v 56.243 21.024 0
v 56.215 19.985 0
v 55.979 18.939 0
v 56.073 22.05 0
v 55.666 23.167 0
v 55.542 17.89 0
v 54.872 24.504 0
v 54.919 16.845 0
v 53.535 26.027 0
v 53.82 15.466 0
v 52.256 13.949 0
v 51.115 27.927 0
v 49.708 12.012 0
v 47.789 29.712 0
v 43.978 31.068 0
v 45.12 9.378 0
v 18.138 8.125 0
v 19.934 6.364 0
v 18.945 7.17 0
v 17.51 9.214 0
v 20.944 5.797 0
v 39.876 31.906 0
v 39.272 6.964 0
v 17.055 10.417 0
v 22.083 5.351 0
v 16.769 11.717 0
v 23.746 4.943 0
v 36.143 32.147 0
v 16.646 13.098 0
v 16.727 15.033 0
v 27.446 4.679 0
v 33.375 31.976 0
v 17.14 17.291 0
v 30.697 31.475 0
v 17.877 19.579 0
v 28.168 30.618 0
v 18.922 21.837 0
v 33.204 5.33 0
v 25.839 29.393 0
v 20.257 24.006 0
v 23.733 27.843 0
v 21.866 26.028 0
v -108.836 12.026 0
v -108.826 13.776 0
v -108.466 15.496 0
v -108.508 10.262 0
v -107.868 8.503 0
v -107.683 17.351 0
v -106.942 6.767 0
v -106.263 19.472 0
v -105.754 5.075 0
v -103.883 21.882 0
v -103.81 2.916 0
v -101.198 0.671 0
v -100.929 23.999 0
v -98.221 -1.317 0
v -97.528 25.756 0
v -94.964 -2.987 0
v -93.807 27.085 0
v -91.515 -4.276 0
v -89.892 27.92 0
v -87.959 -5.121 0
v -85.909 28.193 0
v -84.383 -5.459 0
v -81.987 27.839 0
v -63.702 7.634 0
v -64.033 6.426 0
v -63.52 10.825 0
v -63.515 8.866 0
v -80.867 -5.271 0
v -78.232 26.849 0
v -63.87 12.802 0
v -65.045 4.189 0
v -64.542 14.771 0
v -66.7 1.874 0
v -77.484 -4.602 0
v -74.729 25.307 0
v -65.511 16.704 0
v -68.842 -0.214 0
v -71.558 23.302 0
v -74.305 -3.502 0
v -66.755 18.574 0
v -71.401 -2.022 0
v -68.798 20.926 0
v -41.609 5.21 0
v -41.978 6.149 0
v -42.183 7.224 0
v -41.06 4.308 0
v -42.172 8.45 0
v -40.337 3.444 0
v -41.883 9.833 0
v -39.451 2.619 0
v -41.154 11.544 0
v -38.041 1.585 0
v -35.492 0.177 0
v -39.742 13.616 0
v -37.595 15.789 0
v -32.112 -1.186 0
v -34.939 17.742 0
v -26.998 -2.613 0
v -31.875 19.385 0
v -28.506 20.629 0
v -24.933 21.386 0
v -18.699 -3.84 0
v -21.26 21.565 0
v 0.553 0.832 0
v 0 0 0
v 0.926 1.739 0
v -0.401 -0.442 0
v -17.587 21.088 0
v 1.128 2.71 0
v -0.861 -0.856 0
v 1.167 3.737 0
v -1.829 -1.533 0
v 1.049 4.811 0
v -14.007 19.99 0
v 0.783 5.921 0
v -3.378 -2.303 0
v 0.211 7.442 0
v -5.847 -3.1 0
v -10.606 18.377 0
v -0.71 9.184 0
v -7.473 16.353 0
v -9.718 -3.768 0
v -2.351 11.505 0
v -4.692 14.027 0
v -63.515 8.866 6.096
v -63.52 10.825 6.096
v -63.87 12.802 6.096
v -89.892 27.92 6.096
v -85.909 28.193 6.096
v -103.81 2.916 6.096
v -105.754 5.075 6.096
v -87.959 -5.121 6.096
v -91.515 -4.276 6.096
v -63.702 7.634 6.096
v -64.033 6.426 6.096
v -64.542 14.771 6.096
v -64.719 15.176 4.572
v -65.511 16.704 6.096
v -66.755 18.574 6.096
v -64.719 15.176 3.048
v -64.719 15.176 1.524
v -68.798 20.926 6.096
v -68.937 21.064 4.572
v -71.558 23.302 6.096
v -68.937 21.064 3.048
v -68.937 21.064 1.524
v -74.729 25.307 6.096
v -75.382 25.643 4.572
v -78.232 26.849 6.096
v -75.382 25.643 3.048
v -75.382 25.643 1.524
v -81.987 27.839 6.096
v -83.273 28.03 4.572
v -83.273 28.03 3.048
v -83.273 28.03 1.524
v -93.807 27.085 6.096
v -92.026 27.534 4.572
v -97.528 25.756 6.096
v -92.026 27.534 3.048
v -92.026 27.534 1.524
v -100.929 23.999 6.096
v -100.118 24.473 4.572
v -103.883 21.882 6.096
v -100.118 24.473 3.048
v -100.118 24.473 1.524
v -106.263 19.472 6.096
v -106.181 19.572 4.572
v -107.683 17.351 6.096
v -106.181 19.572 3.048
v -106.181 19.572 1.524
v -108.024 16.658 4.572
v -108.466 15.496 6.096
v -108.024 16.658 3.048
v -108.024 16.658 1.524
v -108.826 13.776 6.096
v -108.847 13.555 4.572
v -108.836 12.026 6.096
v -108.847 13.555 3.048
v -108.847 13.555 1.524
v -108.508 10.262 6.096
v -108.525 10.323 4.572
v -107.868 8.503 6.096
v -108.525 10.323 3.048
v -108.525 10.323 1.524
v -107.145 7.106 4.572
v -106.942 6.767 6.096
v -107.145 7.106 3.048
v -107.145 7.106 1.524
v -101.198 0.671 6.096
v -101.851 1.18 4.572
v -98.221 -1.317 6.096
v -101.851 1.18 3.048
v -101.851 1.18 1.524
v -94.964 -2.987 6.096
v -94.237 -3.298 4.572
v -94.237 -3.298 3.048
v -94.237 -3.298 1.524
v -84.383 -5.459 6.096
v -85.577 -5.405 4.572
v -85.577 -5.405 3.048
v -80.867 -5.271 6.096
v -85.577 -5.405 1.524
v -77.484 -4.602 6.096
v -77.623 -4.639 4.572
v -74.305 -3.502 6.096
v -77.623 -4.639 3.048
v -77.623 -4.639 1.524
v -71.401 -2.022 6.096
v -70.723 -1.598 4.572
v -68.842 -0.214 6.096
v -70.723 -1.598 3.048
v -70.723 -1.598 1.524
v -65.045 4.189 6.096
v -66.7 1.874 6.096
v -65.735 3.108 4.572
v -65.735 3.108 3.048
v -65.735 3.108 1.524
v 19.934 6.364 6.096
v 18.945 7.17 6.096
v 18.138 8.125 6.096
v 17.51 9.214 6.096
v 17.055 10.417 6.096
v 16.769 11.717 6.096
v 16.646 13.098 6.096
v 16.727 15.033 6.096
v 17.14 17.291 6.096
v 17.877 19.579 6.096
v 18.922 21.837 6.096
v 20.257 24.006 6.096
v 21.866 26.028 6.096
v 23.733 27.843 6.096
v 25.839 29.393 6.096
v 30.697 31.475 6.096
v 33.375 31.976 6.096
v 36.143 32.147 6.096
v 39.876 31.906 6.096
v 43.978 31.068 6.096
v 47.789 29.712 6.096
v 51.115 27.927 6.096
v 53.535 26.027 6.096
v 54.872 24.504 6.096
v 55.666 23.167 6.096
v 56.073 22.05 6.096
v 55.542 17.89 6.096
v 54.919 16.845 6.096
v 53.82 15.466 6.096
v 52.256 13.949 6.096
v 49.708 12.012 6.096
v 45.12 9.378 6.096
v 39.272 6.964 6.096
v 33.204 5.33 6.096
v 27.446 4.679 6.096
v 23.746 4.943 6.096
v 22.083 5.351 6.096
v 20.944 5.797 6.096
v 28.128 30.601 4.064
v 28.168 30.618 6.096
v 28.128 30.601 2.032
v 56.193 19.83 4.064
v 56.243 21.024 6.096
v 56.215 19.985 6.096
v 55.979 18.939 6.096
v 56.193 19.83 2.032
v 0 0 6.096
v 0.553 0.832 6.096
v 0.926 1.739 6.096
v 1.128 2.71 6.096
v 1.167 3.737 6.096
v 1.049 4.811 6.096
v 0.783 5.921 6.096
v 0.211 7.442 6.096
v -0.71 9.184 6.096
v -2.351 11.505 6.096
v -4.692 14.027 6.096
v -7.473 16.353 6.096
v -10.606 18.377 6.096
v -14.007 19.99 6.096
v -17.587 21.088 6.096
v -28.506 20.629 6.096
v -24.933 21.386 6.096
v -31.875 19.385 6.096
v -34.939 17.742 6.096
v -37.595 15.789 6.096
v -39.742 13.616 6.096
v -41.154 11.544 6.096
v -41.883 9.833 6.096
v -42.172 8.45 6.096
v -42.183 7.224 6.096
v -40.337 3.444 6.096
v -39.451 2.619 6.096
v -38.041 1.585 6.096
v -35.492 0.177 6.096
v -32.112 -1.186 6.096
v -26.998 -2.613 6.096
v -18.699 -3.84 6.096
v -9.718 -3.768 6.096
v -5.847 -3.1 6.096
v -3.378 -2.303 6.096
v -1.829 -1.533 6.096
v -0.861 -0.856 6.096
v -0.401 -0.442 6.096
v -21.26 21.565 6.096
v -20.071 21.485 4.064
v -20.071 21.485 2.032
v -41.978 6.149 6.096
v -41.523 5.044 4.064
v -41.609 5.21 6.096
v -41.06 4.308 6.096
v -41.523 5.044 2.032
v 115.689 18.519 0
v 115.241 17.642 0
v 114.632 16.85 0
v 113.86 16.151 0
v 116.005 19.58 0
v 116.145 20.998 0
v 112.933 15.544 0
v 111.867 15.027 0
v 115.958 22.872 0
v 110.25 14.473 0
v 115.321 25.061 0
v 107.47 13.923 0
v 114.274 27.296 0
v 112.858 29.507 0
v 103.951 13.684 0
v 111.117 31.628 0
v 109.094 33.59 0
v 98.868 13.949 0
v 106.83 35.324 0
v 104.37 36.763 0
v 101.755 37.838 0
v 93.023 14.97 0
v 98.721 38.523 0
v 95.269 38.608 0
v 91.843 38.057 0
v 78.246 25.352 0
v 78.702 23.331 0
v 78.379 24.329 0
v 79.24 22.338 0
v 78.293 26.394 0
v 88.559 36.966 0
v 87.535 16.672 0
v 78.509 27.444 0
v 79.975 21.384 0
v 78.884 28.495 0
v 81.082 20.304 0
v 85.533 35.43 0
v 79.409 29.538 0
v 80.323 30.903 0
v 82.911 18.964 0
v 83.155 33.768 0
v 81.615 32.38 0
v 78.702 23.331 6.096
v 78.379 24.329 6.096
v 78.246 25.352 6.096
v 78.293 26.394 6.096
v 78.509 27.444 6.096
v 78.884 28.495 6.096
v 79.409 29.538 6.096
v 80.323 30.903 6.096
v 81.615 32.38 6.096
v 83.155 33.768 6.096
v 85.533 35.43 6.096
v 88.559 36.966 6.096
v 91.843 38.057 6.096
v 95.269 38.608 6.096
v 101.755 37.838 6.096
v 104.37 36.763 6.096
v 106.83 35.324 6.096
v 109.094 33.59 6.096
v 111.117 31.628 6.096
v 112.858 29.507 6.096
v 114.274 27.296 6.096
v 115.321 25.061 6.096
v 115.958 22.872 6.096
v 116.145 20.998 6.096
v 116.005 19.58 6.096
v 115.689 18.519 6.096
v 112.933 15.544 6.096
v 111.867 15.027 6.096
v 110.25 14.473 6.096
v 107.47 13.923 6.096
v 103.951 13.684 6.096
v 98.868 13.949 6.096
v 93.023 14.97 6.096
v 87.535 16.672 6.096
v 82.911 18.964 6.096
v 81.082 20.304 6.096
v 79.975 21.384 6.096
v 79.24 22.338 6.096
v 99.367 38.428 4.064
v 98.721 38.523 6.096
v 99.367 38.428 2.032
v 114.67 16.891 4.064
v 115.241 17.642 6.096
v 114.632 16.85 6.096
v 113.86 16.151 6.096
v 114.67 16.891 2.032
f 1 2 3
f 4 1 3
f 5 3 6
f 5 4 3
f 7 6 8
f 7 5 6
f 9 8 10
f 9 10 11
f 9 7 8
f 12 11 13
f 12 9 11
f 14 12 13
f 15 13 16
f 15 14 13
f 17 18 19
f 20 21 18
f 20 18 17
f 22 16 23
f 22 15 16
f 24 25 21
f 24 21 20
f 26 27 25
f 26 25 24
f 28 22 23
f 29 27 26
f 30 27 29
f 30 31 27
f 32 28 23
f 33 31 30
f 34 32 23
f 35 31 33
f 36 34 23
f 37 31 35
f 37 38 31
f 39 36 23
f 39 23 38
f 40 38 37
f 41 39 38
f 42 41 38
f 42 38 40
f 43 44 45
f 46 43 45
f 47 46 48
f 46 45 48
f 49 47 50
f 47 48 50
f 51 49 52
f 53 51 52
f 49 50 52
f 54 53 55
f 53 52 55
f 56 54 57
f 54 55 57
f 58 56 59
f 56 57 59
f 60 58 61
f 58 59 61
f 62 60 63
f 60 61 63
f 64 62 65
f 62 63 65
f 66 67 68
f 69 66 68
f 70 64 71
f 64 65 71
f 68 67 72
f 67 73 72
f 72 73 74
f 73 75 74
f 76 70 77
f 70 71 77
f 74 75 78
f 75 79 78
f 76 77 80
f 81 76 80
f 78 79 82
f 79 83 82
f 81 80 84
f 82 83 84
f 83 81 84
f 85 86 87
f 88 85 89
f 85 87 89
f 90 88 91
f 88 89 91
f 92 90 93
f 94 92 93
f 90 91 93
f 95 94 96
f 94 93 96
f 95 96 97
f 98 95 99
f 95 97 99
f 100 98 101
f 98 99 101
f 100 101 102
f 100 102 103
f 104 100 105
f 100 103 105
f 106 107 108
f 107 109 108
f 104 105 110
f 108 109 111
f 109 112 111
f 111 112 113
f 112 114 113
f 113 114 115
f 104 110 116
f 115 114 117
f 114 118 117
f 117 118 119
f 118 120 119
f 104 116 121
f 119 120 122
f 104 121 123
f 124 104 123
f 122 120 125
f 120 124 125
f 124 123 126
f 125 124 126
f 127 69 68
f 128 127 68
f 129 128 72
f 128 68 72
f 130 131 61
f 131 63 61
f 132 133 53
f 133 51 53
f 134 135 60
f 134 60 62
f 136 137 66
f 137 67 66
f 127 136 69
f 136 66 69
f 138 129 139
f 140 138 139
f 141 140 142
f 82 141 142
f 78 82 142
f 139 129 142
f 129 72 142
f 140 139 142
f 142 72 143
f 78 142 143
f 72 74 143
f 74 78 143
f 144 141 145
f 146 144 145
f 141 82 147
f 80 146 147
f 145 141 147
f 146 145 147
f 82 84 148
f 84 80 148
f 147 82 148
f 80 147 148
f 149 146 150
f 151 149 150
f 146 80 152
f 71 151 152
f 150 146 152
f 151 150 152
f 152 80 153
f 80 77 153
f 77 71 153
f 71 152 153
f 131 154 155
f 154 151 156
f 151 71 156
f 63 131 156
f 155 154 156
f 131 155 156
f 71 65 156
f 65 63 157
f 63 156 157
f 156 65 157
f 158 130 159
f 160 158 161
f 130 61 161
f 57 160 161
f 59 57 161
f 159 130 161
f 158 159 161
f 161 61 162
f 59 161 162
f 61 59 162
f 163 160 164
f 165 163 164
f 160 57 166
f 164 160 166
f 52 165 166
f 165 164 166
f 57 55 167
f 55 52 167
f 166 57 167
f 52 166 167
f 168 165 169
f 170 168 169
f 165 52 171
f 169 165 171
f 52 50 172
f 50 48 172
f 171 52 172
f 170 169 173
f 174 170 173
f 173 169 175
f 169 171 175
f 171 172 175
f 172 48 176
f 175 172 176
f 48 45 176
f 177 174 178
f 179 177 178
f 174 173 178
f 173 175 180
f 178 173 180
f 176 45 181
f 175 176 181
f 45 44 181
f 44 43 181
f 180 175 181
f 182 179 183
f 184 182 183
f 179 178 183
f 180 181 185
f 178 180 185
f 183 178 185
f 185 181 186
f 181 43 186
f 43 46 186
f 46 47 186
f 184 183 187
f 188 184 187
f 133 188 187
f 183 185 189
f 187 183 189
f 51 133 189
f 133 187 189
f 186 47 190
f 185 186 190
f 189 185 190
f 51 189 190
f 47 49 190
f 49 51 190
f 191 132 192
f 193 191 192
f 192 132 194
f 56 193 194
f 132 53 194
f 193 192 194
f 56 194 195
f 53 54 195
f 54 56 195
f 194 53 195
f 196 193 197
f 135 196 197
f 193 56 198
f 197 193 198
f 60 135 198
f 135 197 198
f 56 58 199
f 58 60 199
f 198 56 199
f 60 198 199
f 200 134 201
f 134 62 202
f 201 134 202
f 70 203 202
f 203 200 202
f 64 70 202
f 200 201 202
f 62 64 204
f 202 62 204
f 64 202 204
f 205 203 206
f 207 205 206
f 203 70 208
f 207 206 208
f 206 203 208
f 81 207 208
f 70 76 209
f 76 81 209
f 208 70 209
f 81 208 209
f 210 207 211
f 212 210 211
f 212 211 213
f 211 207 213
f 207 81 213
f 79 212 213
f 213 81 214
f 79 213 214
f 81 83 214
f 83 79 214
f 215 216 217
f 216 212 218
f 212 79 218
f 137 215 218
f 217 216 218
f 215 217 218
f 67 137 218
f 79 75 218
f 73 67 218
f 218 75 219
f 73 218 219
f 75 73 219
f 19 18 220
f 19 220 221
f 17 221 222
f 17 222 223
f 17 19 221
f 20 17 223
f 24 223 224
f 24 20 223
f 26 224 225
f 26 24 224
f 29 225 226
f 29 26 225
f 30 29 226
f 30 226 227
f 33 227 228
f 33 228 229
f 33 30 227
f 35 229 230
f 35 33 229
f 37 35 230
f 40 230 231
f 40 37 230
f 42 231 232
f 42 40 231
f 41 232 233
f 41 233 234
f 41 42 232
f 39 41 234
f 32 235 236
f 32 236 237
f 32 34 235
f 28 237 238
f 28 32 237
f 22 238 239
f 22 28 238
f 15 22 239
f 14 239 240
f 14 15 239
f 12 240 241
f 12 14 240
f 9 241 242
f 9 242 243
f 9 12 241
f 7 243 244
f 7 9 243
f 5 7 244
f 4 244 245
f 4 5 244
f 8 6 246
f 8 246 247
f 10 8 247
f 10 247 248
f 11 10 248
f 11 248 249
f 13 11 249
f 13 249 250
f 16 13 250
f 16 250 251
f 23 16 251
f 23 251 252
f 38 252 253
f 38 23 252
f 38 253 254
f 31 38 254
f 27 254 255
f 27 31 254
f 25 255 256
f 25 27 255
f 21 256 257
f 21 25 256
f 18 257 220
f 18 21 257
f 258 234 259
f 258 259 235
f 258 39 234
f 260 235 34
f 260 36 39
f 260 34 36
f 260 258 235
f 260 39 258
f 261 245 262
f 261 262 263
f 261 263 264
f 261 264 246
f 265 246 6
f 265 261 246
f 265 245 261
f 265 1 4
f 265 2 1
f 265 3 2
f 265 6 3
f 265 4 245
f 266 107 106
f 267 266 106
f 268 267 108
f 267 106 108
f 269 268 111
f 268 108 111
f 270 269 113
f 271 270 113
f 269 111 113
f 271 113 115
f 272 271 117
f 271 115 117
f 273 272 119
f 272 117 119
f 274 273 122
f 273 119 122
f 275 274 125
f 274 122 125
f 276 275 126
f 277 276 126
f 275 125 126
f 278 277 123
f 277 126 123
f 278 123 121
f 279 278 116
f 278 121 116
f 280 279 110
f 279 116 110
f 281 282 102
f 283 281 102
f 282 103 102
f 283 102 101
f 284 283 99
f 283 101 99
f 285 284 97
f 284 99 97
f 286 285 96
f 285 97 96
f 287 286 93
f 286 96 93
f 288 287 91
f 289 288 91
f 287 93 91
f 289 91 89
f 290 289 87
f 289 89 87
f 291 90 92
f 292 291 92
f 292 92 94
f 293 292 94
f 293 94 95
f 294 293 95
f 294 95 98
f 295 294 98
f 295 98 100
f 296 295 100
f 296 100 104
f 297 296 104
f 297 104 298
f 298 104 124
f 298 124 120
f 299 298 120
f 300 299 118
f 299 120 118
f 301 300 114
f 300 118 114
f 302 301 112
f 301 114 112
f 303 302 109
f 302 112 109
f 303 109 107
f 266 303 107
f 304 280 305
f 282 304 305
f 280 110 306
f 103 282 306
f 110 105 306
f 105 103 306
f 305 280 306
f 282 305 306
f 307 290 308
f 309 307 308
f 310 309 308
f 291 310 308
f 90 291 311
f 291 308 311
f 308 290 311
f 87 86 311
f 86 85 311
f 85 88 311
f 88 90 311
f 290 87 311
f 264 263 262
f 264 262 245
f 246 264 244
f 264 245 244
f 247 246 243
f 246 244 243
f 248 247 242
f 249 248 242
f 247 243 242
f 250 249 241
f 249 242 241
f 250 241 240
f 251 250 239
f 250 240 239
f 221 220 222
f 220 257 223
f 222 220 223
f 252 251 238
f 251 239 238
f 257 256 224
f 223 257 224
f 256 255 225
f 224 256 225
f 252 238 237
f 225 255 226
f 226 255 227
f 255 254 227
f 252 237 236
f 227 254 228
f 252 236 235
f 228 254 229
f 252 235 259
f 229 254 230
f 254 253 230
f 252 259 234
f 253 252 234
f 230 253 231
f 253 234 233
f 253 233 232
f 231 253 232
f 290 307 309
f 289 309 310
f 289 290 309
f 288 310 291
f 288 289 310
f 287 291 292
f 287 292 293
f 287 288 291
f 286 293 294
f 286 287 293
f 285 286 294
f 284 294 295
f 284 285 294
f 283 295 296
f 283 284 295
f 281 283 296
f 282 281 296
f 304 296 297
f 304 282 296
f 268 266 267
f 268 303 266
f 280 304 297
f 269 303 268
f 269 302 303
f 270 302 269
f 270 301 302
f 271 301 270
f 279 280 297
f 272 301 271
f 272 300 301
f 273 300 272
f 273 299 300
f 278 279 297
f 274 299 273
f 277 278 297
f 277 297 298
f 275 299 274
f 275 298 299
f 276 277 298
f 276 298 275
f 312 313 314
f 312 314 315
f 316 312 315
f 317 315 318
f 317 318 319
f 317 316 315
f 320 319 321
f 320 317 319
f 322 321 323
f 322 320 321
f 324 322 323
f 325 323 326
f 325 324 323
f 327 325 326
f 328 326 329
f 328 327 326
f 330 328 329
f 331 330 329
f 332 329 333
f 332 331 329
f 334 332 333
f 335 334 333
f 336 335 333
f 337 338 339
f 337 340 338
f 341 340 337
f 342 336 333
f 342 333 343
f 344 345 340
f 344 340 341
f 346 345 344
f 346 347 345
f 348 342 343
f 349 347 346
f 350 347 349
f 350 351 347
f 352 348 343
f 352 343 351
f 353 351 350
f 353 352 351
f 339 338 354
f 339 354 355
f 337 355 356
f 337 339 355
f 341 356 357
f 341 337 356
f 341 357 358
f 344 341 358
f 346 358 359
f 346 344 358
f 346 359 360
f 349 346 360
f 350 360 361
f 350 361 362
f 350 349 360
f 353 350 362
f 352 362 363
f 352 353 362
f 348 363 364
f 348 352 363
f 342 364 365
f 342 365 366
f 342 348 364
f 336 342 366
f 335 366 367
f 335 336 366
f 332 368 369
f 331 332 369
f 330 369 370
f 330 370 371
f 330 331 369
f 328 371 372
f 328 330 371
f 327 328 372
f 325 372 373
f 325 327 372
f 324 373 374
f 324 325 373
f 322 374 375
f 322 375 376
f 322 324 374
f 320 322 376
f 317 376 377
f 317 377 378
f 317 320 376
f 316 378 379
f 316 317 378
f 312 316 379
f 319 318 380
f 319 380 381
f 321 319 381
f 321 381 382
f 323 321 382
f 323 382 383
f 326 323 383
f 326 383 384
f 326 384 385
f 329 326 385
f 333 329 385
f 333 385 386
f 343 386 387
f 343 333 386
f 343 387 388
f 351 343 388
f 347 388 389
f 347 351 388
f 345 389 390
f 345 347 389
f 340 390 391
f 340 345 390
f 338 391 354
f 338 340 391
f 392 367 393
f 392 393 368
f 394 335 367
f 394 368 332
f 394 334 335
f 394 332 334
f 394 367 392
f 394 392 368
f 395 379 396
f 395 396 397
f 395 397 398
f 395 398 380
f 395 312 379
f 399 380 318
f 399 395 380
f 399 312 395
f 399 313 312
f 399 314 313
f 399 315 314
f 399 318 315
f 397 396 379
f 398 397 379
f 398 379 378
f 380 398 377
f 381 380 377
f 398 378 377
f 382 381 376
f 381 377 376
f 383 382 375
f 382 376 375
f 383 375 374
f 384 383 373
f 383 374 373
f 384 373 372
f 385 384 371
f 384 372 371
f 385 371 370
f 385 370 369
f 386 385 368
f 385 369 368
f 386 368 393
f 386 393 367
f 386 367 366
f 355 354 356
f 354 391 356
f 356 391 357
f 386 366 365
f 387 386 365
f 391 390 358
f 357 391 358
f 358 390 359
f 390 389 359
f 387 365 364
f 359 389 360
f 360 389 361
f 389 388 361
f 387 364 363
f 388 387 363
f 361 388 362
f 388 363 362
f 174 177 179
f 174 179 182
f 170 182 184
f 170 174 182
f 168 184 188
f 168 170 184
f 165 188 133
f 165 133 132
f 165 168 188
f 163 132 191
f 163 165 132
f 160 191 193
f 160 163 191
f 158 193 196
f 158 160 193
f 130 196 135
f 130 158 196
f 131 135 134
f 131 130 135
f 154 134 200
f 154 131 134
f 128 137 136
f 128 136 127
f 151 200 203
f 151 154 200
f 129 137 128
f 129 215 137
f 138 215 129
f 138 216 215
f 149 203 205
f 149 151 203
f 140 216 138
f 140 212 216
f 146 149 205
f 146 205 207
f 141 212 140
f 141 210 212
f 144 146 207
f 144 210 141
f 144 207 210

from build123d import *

# Parameters (mm, degrees)
F1_DEPTH = 6.096


with BuildPart() as f1:
    # F0 (on Top) → F1 (new body)
    with BuildSketch(Plane.XY):
        with BuildLine():
            add(Edge.make_bspline(
                [(0, 0), (5.0725048914, 6.2329660703), (-18.9394847967, 33.6549142678), (-61.4398442974, -0.9139423435), (-6.0502408025, -7.4343832972), (0, 0)],
                knots=[0, 0, 0, 0, 0.3173062066, 0.6215323595, 1, 1, 1, 1], degree=3))
        make_face()
    extrude(amount=F1_DEPTH)


with BuildPart() as f1b:
    # F0 (on Top) → F1, piece 2 (new body)
    with BuildSketch(Plane.XY):
        with BuildLine():
            add(Edge.make_bspline(
                [(19.934060052, 6.3640559092), (12.964682373, 11.0302150345), (22.816780856, 42.4279097366), (77.9003890705, 19.4159609589), (28.5033187226, 0.6267395542), (19.934060052, 6.3640559092)],
                knots=[0, 0, 0, 0, 0.3017938399, 0.628926771, 1, 1, 1, 1], degree=3))
        make_face()
    extrude(amount=F1_DEPTH)


with BuildPart() as f1c:
    # F0 (on Top) → F1, piece 3 (new body)
    with BuildSketch(Plane.XY):
        with BuildLine():
            add(Edge.make_bspline(
                [(-63.5150447488, 8.8664228097), (-62.7637448396, 17.1663818459), (-81.8239965362, 36.5595942754), (-121.691040129, 14.5233398555), (-85.7649467191, -13.5751417309), (-64.2490999737, 0.7569738091), (-63.5150447488, 8.8664228097)],
                knots=[0, 0, 0, 0, 0.246632709, 0.5014718496, 0.7590282836, 1, 1, 1, 1], degree=3))
        make_face()
    extrude(amount=F1_DEPTH)


with BuildPart() as f1d:
    # F0 (on Top) → F1, piece 4 (new body)
    with BuildSketch(Plane.XY):
        with BuildLine():
            add(Edge.make_bspline(
                [(78.7021368742, 23.3310032636), (75.6455150341, 30.4538192109), (101.331842803, 50.2642483167), (130.8475874616, 6.2141733545), (82.3544999499, 14.8199373477), (78.7021368742, 23.3310032636)],
                knots=[0, 0, 0, 0, 0.311434312, 0.627866566, 1, 1, 1, 1], degree=3))
        make_face()
    extrude(amount=F1_DEPTH)


solid = Compound([f1.part, f1b.part, f1c.part, f1d.part])
